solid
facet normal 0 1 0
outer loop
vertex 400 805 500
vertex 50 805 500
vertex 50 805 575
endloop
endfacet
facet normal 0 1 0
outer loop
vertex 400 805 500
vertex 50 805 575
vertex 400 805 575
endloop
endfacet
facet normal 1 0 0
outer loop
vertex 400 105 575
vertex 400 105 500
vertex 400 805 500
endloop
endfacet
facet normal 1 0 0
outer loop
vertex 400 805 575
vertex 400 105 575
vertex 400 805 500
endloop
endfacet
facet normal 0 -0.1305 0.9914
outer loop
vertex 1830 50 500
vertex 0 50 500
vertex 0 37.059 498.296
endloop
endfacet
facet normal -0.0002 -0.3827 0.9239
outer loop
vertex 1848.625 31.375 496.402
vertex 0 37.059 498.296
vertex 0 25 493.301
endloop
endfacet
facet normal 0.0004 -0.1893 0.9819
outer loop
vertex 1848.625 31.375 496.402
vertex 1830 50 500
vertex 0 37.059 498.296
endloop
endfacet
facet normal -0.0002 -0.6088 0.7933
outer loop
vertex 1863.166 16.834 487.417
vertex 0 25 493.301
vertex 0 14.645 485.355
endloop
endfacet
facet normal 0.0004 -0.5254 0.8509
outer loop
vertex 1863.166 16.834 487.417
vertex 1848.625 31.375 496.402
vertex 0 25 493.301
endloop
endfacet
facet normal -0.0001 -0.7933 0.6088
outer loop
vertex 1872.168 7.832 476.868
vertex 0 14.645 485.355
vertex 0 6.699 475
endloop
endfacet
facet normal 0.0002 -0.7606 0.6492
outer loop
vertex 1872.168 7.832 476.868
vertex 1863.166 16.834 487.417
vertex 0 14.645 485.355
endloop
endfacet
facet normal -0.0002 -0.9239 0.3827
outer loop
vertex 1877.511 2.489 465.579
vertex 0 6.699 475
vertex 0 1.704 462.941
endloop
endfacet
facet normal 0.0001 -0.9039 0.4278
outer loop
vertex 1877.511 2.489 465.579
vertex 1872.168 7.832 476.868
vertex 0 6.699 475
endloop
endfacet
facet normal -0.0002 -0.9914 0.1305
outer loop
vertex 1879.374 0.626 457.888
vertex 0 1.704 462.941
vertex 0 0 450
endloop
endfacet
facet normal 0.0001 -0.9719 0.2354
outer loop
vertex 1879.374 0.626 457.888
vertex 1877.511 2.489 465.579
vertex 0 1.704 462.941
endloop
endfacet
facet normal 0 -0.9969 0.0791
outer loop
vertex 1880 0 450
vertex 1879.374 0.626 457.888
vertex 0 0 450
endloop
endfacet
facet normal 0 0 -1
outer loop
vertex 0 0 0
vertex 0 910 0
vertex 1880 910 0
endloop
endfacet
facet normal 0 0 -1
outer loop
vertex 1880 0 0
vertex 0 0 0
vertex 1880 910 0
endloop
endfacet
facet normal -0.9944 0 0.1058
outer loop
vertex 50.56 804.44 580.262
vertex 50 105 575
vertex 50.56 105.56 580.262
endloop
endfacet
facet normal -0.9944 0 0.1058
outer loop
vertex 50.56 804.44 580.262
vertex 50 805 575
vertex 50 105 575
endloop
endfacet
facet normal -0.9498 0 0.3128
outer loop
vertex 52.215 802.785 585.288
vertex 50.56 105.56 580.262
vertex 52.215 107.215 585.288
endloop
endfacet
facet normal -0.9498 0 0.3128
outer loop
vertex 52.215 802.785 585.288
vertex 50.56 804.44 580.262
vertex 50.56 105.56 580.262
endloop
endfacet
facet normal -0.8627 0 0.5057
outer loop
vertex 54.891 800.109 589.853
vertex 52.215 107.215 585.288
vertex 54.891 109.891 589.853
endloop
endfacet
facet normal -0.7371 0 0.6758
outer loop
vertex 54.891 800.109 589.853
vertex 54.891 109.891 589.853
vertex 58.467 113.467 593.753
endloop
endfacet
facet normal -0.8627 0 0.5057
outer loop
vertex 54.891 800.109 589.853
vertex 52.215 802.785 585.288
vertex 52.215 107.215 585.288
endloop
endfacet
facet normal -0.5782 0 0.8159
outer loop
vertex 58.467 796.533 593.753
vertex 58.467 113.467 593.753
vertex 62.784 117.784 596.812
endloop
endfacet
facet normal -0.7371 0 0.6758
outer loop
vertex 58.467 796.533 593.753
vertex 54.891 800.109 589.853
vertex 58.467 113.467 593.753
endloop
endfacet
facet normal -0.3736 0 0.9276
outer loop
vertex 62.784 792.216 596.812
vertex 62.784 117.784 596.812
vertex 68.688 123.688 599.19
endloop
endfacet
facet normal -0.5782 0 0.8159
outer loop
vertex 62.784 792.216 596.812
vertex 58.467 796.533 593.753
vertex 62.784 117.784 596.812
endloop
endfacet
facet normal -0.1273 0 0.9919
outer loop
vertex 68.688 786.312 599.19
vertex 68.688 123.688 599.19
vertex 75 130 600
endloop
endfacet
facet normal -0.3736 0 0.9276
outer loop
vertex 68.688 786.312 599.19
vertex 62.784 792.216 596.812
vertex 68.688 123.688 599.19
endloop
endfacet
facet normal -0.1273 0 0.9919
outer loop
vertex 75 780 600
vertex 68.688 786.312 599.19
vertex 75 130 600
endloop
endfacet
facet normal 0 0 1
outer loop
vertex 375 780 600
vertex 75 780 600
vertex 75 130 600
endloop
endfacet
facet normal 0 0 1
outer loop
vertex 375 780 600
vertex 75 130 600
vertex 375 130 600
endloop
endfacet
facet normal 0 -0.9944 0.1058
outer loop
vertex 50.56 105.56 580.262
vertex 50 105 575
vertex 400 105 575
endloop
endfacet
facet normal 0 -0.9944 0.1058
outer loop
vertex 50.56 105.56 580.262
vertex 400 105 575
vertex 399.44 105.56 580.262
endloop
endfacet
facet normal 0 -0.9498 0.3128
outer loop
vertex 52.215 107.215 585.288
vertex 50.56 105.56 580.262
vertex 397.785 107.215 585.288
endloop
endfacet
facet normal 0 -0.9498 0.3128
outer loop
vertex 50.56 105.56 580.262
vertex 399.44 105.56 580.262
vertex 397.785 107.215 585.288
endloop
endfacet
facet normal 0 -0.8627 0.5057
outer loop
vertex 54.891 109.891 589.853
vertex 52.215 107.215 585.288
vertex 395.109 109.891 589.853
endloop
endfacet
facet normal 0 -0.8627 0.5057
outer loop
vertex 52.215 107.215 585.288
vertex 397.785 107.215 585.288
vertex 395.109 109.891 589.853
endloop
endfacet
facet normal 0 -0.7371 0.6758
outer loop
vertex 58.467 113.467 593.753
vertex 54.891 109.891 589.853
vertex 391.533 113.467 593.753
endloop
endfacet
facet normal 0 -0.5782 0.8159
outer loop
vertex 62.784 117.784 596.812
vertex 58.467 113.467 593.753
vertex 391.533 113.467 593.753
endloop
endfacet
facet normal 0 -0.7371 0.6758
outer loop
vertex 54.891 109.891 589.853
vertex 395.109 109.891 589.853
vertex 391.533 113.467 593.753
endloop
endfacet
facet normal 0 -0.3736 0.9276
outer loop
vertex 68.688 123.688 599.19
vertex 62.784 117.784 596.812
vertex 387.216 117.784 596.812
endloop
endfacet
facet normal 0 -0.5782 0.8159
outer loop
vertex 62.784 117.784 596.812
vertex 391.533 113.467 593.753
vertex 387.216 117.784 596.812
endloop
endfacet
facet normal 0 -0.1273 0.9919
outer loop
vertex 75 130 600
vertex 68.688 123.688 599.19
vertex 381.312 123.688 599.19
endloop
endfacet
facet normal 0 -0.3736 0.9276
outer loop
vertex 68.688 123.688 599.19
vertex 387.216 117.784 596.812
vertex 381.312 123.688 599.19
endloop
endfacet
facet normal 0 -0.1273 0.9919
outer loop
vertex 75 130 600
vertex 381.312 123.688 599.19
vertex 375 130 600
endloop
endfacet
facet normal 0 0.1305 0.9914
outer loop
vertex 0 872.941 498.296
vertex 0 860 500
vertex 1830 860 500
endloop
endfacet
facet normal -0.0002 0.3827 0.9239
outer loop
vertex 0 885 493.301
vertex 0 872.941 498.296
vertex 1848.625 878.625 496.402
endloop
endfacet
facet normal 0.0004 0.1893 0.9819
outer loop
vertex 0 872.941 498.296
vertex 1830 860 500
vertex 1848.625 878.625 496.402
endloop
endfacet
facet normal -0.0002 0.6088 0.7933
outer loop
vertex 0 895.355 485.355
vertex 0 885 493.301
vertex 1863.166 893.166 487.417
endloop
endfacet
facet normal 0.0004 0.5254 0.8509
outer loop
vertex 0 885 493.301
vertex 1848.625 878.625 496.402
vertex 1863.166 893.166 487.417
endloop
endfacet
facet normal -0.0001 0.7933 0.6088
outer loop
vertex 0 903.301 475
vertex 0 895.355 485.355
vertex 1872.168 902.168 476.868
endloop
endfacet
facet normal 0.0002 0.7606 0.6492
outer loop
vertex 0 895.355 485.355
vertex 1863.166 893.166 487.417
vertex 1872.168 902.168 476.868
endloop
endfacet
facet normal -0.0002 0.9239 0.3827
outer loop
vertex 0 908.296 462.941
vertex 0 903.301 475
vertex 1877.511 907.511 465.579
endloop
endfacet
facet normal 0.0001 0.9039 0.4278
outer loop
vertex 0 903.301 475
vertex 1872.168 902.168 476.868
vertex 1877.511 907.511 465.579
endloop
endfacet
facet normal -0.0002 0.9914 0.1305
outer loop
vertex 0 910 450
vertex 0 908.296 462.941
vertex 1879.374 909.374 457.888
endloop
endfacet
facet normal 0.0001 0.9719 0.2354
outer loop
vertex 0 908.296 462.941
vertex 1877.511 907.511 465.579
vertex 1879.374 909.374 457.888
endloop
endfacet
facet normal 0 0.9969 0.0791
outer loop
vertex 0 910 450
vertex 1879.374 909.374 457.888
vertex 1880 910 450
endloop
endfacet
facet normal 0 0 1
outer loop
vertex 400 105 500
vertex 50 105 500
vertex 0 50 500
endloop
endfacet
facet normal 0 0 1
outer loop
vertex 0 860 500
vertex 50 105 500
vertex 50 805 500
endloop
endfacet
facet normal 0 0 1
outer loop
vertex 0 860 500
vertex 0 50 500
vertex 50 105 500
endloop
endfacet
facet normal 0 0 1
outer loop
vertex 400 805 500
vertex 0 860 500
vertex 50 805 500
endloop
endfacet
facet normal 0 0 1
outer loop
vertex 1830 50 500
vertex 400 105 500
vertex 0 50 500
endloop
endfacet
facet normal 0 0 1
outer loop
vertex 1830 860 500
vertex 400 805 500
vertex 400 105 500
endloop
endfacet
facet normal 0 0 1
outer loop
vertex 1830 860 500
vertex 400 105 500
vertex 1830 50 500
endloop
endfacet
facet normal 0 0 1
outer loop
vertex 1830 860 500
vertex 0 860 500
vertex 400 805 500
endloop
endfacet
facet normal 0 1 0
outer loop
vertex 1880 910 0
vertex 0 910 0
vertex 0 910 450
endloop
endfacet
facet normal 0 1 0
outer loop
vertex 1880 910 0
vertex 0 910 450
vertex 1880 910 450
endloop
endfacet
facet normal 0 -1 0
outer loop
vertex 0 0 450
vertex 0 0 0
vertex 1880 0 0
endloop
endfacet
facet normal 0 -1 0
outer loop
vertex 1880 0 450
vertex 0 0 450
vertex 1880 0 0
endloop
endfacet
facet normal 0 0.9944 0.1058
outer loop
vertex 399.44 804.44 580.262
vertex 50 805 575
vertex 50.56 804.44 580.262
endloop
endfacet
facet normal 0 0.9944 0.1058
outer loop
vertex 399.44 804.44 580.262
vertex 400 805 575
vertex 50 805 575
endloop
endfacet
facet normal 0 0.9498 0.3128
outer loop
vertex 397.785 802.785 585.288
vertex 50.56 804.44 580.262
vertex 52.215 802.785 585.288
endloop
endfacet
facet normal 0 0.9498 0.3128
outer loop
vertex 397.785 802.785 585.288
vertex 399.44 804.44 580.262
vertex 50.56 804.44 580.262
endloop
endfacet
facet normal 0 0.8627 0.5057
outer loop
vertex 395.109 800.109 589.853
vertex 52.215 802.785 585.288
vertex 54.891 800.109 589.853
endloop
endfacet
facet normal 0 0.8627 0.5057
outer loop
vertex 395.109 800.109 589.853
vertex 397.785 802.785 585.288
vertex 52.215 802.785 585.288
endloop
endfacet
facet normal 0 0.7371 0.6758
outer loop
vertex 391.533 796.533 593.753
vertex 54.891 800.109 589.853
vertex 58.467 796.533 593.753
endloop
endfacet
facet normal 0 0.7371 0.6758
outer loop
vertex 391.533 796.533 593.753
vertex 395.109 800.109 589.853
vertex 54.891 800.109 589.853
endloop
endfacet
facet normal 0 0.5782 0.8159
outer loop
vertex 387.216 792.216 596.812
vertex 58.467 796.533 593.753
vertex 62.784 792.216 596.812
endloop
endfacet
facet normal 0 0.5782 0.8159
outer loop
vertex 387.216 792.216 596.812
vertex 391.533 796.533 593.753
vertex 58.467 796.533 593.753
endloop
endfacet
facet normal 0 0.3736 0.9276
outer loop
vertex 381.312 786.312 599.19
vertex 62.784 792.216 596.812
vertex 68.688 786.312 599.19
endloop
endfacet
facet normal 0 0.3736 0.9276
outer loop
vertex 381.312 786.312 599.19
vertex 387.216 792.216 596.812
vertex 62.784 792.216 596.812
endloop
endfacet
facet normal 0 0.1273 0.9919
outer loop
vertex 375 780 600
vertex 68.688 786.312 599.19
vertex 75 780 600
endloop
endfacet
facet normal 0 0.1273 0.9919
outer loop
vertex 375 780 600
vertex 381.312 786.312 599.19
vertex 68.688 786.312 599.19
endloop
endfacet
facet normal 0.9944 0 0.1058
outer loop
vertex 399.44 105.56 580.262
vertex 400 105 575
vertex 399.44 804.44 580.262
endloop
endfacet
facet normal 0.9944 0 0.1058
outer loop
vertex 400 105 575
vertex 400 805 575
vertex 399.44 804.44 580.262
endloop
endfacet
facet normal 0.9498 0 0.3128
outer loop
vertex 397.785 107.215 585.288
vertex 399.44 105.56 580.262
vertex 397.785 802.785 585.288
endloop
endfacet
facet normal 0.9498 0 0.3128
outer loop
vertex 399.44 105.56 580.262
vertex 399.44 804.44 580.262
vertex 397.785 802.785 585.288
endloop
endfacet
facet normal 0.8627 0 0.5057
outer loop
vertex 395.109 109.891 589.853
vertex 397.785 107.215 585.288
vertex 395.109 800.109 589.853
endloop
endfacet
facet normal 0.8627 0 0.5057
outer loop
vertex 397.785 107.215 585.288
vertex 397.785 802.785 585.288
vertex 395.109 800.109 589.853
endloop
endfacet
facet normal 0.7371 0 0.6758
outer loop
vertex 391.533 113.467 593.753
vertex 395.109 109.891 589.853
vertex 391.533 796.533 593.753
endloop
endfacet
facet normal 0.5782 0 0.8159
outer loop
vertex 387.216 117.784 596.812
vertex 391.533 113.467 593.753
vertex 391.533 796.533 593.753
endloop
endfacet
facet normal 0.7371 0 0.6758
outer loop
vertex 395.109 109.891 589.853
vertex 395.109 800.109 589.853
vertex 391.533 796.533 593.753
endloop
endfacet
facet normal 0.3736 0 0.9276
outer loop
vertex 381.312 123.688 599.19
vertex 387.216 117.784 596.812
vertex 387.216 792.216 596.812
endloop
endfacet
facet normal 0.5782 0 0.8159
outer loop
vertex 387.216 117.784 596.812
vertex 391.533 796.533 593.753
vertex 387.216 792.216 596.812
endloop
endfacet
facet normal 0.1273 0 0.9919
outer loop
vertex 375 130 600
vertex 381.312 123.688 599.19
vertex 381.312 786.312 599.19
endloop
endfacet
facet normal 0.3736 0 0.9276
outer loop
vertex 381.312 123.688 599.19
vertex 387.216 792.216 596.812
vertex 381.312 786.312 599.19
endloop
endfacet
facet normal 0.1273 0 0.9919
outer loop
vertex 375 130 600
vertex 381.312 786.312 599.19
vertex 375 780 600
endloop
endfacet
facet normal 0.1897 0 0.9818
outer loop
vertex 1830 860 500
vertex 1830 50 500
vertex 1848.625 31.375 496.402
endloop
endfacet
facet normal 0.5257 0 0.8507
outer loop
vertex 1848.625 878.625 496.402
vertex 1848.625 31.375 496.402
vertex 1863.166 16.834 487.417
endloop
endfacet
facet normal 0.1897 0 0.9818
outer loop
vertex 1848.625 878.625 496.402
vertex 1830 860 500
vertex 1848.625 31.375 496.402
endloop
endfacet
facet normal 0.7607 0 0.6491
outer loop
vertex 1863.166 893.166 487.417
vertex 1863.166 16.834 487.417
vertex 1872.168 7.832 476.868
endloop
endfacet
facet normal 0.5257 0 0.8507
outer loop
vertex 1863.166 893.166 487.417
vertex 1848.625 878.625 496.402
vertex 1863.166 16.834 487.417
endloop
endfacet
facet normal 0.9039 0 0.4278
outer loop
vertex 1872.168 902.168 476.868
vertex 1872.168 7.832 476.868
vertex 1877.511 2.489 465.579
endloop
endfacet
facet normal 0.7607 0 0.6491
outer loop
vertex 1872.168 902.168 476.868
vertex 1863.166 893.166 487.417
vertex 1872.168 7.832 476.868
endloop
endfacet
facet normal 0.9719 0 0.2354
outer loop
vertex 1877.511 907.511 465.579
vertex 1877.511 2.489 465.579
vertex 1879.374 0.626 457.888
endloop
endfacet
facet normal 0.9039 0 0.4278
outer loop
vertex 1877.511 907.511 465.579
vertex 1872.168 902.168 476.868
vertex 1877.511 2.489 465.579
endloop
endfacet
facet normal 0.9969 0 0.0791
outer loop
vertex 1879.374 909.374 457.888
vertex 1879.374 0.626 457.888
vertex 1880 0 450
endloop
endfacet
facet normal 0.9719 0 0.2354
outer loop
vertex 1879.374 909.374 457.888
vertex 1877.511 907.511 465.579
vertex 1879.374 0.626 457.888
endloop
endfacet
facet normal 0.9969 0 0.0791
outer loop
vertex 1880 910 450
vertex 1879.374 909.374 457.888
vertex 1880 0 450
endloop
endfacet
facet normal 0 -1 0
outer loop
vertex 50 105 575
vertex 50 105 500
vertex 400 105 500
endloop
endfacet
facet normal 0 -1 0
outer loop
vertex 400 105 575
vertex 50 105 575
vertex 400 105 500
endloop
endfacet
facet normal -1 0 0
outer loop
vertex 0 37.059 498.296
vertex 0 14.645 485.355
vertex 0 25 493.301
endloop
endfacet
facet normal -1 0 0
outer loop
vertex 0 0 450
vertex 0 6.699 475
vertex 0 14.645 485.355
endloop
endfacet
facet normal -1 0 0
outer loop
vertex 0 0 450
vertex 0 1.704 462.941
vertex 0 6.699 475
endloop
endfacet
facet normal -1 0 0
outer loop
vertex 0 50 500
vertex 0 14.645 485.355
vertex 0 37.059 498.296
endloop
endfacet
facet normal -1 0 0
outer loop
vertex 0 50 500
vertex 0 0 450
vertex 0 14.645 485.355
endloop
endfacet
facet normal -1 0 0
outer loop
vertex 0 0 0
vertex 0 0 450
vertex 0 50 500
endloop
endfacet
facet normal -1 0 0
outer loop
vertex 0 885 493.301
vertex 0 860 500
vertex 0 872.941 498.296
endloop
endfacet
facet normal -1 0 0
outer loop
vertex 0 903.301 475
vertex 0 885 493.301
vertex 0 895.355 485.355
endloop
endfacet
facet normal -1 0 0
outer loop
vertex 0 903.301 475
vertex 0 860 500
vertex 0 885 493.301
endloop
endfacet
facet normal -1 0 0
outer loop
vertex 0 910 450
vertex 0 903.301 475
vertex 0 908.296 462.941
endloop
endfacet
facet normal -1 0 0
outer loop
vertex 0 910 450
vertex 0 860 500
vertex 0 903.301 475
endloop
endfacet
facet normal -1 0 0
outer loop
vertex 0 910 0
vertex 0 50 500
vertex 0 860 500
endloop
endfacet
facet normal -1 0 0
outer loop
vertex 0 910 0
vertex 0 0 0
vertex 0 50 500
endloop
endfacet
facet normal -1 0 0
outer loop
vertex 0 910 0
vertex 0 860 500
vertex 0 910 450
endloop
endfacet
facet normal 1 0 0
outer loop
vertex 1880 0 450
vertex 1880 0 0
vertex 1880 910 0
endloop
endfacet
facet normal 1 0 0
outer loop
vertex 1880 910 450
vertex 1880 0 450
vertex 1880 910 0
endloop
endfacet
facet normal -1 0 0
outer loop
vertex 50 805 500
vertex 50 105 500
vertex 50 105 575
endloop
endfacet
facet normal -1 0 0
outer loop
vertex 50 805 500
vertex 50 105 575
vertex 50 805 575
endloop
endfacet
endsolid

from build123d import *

# Parameters (mm, degrees)
F0_W     = 1880
F0_H     = 910
F1_DEPTH = 500
F2_W     = 350
F2_H     = 700
F3_DEPTH = 100
F4_R     = 25
F5_R     = 50


with BuildPart() as f1:
    # F0 (on Top) → F1 (new body)
    with BuildSketch(Plane.XY):
        with Locations((940, 455)):
            Rectangle(F0_W, F0_H)
    extrude(amount=F1_DEPTH)

    # F2 (on face) → F3 (join)
    with BuildSketch(Plane.XY.offset(500)):
        with Locations((225, 455)):
            Rectangle(F2_W, F2_H)
    extrude(amount=F3_DEPTH)

    # F4
    f4_edges = [f1.edges().sort_by_distance(p)[0] for p in [
        (50, 455, 600),
        (225, 105, 600),
        (400, 455, 600),
        (225, 805, 600),
    ]]
    fillet(f4_edges, radius=F4_R)

    # F5
    f5_edges = [f1.edges().sort_by_distance(p)[0] for p in [
        (940, 910, 500),
        (1880, 455, 500),
        (940, 0, 500),
    ]]
    fillet(f5_edges, radius=F5_R)


solid = f1.part
